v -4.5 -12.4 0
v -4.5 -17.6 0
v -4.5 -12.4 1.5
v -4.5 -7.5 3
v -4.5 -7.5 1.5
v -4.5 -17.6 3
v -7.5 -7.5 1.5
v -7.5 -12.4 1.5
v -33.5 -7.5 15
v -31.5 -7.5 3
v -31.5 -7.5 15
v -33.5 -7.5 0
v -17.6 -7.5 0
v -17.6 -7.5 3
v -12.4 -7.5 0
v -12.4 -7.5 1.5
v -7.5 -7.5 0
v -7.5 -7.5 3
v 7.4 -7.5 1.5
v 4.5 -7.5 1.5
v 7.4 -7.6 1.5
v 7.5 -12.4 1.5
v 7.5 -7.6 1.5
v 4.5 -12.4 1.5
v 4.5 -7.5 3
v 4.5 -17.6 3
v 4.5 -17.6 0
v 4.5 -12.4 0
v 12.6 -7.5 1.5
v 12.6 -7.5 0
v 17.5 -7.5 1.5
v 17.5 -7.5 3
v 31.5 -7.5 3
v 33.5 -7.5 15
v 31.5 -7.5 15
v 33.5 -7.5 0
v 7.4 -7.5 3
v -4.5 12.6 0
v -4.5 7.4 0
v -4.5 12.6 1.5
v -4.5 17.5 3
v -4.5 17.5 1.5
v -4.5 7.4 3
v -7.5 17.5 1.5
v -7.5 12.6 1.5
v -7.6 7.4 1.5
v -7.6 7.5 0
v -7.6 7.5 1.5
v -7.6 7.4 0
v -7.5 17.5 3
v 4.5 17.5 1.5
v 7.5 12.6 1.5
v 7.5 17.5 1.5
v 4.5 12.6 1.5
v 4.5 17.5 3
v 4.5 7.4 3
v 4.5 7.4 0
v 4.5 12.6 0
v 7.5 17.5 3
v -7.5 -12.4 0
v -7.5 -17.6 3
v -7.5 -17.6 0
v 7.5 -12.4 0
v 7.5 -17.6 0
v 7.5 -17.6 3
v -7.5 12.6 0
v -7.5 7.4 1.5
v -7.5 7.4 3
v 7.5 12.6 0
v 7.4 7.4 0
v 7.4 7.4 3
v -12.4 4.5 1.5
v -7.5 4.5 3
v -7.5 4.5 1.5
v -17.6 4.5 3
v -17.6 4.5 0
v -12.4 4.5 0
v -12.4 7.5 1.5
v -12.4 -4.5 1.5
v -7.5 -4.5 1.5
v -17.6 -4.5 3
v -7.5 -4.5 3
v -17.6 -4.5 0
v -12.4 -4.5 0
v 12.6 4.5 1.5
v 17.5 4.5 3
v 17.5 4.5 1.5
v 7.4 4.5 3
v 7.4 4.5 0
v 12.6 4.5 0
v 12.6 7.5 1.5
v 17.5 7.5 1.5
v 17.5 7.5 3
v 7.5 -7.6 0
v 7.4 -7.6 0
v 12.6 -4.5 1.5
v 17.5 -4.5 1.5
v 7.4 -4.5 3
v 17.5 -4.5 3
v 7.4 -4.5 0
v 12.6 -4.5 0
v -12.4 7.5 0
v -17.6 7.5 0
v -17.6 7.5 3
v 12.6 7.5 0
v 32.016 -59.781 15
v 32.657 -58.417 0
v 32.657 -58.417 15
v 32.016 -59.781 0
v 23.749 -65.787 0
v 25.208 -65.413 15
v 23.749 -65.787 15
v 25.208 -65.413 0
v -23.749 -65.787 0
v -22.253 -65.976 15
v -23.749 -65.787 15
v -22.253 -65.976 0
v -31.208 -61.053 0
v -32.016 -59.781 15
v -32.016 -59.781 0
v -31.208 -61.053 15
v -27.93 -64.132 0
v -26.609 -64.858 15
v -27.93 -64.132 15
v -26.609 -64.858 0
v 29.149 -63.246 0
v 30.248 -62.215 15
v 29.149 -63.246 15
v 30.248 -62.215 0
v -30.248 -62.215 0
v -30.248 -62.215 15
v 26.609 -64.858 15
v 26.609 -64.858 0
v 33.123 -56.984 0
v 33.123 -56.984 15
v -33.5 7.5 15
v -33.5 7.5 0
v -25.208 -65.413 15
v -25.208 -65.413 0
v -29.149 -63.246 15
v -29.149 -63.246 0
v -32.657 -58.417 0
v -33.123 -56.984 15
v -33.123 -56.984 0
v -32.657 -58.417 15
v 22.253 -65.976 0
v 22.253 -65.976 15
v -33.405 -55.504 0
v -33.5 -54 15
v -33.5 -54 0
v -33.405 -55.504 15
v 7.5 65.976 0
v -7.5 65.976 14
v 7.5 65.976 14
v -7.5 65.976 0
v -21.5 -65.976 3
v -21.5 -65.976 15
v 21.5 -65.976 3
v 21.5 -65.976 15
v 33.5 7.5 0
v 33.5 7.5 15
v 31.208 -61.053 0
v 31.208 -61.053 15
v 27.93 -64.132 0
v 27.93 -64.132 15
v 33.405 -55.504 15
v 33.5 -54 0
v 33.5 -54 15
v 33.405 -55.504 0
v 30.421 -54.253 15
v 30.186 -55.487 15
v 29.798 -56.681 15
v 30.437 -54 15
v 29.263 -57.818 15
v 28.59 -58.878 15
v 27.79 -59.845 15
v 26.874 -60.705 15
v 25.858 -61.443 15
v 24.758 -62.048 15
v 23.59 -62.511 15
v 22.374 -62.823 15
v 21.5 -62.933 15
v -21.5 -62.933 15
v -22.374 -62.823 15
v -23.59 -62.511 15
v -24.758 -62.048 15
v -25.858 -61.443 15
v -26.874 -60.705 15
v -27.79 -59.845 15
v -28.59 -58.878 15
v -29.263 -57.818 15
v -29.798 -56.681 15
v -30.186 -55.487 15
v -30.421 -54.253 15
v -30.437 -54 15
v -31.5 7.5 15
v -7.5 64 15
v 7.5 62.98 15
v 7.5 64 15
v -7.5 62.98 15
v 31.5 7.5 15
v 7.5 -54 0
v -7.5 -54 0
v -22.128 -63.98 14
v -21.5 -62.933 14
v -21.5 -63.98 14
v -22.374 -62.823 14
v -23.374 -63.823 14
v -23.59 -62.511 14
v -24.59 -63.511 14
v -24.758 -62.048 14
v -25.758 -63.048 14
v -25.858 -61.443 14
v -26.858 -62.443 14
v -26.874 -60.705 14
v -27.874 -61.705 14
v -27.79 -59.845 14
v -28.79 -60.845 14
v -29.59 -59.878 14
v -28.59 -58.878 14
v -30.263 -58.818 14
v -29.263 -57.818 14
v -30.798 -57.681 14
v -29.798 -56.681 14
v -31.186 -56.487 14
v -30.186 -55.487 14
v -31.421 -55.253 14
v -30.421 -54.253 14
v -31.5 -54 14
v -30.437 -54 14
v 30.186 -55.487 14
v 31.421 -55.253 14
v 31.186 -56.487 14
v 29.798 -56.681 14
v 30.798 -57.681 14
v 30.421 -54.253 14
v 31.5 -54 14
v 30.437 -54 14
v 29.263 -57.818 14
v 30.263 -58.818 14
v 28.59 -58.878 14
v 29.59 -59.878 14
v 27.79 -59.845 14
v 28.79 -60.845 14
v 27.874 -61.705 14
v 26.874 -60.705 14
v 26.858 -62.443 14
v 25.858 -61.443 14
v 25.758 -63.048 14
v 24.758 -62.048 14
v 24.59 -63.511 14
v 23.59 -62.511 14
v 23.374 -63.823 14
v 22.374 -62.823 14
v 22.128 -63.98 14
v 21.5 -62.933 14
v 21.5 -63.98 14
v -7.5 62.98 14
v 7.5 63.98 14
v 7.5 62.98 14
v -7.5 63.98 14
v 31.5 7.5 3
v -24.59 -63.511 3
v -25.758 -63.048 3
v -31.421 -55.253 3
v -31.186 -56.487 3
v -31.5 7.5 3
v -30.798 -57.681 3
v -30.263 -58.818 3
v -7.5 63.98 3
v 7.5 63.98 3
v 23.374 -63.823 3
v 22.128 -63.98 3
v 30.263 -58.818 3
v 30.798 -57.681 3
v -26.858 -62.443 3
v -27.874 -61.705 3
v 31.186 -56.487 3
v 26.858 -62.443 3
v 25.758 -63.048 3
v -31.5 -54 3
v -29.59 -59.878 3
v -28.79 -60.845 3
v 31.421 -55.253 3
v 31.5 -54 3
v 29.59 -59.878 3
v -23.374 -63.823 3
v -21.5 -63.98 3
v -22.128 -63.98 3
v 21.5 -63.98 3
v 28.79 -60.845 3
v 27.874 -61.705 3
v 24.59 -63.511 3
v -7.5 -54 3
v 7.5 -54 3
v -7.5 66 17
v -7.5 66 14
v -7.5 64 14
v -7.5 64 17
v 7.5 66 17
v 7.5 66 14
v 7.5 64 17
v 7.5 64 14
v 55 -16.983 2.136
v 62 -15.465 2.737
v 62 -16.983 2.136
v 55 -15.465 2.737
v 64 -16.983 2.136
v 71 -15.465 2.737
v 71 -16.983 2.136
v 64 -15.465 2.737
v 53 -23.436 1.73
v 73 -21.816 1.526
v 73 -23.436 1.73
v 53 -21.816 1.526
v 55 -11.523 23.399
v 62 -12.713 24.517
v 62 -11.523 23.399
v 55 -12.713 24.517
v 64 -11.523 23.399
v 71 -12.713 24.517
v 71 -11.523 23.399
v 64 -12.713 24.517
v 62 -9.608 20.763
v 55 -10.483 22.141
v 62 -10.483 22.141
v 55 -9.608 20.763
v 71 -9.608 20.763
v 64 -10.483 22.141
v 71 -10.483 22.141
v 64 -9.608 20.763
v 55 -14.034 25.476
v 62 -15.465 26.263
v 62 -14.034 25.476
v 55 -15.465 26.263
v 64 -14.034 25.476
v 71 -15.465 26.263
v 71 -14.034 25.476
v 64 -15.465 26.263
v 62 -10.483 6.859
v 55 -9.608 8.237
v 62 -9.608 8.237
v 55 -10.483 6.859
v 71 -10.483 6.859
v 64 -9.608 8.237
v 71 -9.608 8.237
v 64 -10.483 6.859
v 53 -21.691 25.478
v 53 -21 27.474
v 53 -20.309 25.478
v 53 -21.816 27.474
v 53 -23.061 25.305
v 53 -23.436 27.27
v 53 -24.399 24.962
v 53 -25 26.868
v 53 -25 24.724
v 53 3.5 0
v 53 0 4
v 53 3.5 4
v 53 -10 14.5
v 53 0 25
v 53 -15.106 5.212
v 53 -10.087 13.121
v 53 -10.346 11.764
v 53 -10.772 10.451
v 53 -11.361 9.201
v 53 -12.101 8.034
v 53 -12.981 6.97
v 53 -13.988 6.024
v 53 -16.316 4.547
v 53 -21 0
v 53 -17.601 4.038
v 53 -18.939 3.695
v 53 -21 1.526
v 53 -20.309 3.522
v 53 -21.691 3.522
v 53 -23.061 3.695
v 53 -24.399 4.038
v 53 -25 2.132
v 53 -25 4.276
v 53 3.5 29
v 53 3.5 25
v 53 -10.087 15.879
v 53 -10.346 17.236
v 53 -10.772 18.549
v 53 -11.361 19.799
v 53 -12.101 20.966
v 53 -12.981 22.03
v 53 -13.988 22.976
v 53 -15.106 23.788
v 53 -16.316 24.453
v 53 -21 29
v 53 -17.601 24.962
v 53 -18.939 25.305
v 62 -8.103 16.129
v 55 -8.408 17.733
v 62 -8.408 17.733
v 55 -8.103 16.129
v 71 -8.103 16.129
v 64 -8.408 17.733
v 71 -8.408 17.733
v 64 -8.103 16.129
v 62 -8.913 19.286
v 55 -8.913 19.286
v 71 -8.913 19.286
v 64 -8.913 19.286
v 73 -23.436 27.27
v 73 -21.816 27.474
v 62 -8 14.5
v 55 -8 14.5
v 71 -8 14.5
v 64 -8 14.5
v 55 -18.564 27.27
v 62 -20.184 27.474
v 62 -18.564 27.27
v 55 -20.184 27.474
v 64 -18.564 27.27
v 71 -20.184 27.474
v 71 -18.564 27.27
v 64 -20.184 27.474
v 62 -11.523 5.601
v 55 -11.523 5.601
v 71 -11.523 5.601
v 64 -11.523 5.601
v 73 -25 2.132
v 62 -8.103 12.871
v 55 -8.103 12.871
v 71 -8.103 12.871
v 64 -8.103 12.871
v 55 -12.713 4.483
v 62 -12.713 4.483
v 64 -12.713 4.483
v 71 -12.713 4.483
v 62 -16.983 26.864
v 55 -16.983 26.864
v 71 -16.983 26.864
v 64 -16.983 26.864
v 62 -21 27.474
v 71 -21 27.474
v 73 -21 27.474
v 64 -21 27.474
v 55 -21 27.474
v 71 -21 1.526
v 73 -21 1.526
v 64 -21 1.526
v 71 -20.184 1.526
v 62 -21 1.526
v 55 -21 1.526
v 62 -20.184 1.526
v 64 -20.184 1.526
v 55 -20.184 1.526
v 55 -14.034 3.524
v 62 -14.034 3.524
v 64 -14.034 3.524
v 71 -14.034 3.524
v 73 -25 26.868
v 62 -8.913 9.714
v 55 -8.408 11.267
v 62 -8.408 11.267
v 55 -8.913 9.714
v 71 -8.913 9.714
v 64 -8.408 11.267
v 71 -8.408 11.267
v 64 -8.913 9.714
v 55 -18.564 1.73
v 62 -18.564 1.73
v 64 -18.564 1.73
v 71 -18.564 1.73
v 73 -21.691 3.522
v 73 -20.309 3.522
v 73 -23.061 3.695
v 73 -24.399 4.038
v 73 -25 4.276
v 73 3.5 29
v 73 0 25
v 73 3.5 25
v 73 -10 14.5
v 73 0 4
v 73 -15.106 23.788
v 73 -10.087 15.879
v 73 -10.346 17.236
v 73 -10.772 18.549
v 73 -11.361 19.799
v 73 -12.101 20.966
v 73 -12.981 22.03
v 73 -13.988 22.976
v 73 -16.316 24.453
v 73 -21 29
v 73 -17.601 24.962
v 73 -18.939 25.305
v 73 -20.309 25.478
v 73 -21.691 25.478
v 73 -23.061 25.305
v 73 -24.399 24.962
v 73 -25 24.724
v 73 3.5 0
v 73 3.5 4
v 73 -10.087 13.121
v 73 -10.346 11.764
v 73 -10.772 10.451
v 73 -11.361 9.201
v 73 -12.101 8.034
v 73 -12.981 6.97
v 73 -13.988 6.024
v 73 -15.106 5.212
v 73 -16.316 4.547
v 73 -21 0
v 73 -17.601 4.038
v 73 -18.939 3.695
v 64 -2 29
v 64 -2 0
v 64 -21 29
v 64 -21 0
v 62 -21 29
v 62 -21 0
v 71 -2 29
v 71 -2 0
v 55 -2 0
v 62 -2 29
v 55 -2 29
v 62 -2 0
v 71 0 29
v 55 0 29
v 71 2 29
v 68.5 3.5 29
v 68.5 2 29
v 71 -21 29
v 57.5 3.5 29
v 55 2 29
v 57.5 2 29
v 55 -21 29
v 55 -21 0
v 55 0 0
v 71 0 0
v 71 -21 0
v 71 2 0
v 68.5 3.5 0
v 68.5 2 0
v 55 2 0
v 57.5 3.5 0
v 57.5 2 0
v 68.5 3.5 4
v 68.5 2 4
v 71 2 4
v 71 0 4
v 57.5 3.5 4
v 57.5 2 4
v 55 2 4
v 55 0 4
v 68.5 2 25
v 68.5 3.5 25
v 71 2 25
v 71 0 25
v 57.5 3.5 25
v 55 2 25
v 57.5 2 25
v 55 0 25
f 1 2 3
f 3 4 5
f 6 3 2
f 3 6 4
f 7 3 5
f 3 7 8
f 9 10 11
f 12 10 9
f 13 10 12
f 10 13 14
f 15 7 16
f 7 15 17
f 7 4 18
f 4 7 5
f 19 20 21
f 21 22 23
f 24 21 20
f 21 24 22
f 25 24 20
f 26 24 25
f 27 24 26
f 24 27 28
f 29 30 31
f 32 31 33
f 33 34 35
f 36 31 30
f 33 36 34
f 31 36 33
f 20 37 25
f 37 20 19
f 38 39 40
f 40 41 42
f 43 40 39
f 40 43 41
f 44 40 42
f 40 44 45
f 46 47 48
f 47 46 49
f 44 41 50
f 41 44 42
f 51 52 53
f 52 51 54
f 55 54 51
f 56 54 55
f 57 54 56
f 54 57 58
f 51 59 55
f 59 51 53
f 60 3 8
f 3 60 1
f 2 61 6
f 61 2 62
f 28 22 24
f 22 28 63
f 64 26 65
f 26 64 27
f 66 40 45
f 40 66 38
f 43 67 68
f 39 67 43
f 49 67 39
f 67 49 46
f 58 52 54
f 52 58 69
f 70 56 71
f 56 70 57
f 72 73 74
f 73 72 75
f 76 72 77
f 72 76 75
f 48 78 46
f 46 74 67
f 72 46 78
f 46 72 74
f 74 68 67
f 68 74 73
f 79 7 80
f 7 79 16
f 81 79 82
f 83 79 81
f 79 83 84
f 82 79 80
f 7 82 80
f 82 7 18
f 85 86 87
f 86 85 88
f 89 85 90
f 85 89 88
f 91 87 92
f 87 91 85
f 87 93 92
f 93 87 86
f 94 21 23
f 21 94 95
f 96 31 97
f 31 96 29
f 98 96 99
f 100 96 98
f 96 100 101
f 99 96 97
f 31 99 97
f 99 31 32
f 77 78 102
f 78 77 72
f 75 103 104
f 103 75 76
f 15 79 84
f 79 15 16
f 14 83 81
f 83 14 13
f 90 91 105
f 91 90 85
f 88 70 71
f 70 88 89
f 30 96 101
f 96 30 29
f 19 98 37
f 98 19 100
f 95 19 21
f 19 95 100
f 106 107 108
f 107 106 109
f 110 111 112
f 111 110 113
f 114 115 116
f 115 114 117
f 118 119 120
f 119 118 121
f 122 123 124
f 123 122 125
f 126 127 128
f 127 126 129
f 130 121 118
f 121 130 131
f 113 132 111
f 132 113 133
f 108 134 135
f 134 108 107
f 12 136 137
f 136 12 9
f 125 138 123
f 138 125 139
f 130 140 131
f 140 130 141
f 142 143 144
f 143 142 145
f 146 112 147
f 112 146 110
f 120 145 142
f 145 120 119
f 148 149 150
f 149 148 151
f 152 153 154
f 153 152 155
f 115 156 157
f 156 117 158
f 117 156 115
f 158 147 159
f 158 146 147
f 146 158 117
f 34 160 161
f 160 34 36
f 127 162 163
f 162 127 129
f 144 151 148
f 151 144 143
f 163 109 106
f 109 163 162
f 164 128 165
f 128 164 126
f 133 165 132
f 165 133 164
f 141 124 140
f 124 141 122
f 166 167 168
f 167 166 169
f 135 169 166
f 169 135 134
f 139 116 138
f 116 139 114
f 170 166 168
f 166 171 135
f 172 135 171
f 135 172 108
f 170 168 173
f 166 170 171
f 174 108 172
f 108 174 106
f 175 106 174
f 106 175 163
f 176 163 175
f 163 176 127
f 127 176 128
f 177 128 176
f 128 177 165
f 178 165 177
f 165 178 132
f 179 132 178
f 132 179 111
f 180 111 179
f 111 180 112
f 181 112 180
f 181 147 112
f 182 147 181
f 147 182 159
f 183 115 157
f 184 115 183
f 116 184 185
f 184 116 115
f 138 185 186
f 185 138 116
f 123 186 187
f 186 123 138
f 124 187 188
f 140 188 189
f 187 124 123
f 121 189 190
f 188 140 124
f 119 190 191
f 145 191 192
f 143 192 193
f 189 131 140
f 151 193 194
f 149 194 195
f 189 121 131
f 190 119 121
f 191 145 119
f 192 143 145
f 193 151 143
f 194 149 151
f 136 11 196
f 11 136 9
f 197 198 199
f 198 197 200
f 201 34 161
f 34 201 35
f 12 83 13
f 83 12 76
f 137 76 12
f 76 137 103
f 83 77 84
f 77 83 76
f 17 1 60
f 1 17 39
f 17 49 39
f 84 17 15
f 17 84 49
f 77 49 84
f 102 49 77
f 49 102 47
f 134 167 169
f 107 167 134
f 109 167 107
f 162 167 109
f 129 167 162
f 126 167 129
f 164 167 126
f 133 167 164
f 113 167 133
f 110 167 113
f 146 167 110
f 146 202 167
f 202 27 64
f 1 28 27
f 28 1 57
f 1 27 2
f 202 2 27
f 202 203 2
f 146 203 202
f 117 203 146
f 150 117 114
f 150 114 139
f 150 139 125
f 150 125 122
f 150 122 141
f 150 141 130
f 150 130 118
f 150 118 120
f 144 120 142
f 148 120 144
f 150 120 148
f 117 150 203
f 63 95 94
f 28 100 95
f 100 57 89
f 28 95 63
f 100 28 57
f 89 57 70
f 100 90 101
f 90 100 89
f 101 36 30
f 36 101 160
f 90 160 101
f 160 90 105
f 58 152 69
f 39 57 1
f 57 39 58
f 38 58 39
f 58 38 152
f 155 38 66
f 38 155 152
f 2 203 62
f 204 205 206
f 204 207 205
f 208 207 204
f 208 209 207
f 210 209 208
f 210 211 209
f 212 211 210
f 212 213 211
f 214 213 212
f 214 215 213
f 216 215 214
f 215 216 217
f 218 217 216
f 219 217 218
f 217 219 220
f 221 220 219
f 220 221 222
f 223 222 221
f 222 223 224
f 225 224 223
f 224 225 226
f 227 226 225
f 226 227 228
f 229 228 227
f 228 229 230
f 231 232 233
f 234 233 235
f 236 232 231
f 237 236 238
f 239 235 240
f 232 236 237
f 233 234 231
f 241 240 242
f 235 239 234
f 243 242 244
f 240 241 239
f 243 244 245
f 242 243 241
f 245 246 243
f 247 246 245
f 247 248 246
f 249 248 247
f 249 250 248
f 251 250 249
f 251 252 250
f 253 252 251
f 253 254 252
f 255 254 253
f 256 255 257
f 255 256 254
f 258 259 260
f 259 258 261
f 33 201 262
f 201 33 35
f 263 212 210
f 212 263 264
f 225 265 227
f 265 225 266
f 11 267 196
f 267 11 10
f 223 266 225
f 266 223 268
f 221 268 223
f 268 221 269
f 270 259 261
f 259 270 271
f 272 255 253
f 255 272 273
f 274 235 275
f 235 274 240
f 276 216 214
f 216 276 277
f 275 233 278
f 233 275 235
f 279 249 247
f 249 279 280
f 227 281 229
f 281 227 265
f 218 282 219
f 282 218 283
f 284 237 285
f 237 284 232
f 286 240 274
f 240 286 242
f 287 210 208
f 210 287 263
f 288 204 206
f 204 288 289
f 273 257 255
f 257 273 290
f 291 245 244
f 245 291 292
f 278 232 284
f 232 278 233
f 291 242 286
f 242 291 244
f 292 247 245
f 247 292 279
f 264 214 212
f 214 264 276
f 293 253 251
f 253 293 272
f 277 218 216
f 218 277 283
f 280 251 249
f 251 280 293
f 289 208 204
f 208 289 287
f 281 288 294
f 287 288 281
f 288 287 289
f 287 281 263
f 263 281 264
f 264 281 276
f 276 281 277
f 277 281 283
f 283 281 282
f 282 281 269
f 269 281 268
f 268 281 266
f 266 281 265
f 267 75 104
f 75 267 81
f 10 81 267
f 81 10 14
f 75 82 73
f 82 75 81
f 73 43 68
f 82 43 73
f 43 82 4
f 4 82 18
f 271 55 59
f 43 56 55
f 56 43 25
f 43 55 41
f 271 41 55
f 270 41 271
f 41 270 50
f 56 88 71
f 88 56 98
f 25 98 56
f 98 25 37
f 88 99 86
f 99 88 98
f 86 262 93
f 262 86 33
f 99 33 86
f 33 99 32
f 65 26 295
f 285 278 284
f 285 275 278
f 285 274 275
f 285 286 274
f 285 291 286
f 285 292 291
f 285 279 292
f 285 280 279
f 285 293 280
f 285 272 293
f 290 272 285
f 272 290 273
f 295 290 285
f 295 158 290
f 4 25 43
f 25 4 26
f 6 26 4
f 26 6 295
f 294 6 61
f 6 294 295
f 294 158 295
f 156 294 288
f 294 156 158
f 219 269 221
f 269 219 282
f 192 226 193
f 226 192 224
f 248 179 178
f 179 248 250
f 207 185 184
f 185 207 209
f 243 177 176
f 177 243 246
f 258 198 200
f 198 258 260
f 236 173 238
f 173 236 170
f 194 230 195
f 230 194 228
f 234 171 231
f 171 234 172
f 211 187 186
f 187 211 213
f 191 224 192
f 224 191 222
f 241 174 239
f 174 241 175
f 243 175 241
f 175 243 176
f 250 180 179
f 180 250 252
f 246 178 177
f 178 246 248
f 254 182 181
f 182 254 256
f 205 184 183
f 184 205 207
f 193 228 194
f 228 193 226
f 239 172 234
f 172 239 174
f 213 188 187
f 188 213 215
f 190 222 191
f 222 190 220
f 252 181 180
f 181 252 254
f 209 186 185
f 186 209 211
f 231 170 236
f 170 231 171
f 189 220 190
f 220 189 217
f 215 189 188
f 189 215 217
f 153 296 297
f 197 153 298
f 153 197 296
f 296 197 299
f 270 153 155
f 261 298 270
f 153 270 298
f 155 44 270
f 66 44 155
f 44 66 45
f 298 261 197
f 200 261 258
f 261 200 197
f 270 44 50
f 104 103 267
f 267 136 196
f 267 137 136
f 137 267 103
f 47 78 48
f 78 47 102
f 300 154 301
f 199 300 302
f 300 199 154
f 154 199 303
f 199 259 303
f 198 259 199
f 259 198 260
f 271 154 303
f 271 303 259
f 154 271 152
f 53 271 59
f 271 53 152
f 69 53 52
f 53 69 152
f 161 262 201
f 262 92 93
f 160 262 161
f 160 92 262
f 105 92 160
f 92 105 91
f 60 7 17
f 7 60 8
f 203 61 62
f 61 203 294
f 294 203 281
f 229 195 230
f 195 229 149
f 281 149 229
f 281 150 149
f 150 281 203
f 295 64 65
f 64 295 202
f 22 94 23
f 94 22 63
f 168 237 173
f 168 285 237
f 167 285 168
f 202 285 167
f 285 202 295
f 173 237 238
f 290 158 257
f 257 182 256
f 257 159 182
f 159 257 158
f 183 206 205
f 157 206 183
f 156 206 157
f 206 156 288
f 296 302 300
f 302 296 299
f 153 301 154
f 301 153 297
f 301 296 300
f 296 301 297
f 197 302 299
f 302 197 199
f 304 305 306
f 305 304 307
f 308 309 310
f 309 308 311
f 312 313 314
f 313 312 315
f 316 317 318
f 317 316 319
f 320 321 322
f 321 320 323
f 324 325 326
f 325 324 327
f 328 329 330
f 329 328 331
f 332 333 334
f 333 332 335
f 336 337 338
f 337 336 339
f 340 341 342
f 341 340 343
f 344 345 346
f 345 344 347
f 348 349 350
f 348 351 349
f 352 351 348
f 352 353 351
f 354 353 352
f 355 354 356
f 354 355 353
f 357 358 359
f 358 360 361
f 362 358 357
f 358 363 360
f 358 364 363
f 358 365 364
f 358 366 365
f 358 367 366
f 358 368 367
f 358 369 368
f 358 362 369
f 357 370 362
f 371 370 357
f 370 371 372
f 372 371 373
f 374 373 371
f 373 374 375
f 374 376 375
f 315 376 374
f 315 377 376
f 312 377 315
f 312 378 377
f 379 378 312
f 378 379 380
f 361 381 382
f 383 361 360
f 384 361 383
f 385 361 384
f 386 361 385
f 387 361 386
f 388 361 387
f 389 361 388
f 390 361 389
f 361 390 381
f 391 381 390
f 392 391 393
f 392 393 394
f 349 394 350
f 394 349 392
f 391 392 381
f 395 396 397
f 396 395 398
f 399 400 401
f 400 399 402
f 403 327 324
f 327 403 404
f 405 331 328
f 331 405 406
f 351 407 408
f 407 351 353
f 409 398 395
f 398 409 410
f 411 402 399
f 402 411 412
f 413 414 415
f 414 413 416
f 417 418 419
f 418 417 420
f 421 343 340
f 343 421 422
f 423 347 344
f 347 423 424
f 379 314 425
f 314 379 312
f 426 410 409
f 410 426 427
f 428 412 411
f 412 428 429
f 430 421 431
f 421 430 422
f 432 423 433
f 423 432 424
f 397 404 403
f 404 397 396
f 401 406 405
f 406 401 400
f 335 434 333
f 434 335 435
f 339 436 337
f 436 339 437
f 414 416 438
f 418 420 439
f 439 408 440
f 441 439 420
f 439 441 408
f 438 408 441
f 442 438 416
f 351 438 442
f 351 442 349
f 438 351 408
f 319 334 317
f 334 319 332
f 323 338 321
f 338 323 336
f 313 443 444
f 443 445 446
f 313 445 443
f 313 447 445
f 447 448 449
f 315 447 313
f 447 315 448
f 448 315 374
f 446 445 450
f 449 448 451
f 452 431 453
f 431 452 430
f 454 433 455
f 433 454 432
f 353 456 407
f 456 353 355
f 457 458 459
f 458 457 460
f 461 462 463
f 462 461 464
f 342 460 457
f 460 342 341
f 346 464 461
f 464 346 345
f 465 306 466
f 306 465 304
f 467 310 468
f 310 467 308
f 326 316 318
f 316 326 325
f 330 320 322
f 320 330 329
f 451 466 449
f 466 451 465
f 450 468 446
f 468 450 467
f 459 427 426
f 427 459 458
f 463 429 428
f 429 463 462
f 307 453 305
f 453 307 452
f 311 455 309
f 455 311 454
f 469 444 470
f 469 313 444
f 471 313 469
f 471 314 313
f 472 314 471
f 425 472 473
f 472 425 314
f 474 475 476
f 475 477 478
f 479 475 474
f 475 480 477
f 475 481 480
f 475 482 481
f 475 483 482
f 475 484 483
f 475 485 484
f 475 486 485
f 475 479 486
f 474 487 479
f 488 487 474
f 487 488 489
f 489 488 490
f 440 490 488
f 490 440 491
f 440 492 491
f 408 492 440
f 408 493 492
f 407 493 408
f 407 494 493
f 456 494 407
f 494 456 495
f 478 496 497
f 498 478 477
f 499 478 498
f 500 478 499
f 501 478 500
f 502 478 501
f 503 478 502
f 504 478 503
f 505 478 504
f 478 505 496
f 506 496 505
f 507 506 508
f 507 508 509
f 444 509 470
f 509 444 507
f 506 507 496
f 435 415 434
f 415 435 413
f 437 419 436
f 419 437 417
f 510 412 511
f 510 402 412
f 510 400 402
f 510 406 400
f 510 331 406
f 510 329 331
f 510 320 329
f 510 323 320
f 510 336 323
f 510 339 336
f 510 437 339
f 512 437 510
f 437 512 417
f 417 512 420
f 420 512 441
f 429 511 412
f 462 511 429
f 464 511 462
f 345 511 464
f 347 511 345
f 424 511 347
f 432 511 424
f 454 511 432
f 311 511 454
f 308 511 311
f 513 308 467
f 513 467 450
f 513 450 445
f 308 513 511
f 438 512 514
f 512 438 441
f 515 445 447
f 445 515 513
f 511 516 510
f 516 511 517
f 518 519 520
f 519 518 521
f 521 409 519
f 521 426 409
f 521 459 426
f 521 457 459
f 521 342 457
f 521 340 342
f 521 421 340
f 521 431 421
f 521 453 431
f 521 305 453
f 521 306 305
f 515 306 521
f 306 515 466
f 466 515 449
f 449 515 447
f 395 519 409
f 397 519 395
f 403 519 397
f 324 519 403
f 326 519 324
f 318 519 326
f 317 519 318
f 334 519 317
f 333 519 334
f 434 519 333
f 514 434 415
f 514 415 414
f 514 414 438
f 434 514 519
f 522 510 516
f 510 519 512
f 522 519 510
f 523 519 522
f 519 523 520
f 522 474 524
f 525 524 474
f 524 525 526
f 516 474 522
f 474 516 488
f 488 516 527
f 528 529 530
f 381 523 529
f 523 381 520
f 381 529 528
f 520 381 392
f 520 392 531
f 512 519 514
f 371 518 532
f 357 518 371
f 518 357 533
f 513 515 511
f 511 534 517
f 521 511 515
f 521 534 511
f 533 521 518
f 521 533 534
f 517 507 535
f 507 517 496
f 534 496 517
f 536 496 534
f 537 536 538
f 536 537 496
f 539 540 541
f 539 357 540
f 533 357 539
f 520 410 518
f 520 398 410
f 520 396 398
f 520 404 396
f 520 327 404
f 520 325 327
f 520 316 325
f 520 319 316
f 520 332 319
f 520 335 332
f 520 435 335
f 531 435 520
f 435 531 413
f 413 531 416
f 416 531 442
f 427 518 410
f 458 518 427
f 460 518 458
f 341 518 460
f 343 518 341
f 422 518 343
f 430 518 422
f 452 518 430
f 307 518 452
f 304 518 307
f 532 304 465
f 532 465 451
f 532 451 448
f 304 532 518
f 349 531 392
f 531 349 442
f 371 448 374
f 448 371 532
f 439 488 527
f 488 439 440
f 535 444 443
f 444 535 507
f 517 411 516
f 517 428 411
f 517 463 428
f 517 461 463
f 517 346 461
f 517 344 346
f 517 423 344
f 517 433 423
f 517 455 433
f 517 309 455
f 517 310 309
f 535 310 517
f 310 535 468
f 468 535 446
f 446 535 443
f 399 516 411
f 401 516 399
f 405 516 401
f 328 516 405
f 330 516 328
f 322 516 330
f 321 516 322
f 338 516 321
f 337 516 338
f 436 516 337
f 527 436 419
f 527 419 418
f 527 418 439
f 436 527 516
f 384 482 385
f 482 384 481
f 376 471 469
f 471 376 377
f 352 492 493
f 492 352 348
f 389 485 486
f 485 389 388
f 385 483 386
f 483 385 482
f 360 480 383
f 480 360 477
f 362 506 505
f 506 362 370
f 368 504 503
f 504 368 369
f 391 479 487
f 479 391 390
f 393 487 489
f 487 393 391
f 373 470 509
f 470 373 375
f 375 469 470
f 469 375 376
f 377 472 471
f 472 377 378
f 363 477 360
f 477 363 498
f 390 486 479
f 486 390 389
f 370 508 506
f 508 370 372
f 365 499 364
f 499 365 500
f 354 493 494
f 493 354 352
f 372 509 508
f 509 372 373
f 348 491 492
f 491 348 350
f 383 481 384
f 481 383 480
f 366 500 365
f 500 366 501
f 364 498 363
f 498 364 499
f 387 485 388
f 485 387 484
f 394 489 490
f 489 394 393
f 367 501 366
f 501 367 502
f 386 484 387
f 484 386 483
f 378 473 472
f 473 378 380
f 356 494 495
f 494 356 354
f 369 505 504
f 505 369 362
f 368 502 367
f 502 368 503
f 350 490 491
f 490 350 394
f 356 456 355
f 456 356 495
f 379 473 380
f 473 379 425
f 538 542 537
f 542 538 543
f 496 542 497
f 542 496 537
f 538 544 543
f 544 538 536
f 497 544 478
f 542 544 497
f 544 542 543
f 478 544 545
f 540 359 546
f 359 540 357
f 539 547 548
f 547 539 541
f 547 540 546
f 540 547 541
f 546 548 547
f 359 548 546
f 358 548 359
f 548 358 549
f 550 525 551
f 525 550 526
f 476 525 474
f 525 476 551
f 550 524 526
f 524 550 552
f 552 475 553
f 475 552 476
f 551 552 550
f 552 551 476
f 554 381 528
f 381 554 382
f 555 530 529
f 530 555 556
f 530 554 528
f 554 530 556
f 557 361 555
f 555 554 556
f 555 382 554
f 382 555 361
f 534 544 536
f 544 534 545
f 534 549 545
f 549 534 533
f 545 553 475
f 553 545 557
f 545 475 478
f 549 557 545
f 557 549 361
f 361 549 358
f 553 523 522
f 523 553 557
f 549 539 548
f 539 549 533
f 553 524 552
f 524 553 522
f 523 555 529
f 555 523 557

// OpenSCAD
// The outer width (from left to right without buttons) of the phone or bumper in millimeters
width = 63;
// The outer length (from top to bottom without buttons) of the phone or bumper in millimeters
length = 128;
// The outer height (from backside to front side) of the phone or bumper in millimeters
height = 11;
// The width of the bridges from top to bottom and from left to right in millimeters. Lower values save material, higher values make the mount more stable. 15 millimeter is a good choice.
bridgewidth = 15;
// The radius of the corners of the phone or bumper. The standard Apple bumper for iPhone 5 has a corner radius of 10 millimeter.
cornerradius = 10;
// The distance bwtween the iPhone holder and the bike's tube in millimeter. Make it larger when you have other obstacles mounted on the bike.
mountheight = 10;
// The diameter of the tube where to mount the holder in millimeters.
tubediameter = 22;
// The fininess of the cylinders. 100 is a good start.
$fn = 50;

module connector(stegwidth) {
	// plates
	translate([-stegwidth/2-2.5,-stegwidth/2-4.5,2]) cube([4.5,4,1.5]);
	translate([stegwidth/2-2,-stegwidth/2-4.5,2]) cube([4.5,4,1.5]);
	translate([-stegwidth/2-2.5,stegwidth/2+5.5,2]) cube([4.5,4,1.5]);
	translate([stegwidth/2-2,stegwidth/2+5.5,2]) cube([4.5,4,1.5]);
	// pins
	translate([-stegwidth/2-2.5,-stegwidth/2-4.5,0]) cube([2,4,2]);
	translate([stegwidth/2+0.5,-stegwidth/2-4.5,0]) cube([2,4,2]);
	translate([-stegwidth/2-2.5,stegwidth/2+5.5,0]) cube([2,4,2]);
	translate([stegwidth/2+0.5,stegwidth/2+5.5,0]) cube([2,4,2]);
}

module connectorcutout(stegwidth) {
		translate([-stegwidth/2-0.1,-stegwidth/2-5,1.5]) cube([3.1,5,1.6]);
		translate([stegwidth/2-3,-stegwidth/2-5,1.5]) cube([3.1,5,1.6]);
		translate([-stegwidth/2-0.1,stegwidth/2+5,1.5]) cube([3.1,5,1.6]);
		translate([stegwidth/2-3,stegwidth/2+5,1.5]) cube([3.1,5,1.6]);
		translate([-stegwidth/2-0.1,-stegwidth/2-10.1,-0.1]) cube([3.1,5.2,3.2]);
		translate([stegwidth/2-3,-stegwidth/2-10.1,-0.1]) cube([3.1,5.2,3.2]);
		translate([-stegwidth/2-0.1,stegwidth/2-0.1,-0.1]) cube([3.1,5.2,3.2]);
		translate([stegwidth/2-3,stegwidth/2-0.1,-0.1]) cube([3.1,5.2,3.2]);
}

module case(width, height, depth, radius, stegwidth) {
	difference() {
		// Outer hull
		hull() {
			translate([-width/2+radius, -height/2+radius, 0]) cylinder(r=radius+2, h=depth+4);
			translate([-width/2+radius, +height/2-radius, 0]) cylinder(r=radius+2, h=depth+4);
			translate([+width/2-radius, -height/2+radius, 0]) cylinder(r=radius+2, h=depth+4);
			translate([+width/2-radius, +height/2-radius, 0]) cylinder(r=radius+2, h=depth+4);
		}
		// substract iPhone itself
		hull() {
			translate([-width/2+radius, -height/2+radius, 3]) cylinder(r=radius, h=depth);
			translate([-width/2+radius, +height/2-radius, 3]) cylinder(r=radius, h=depth);
			translate([+width/2-radius, -height/2+radius, 3]) cylinder(r=radius, h=depth);
			translate([+width/2-radius, +height/2-radius, 3]) cylinder(r=radius, h=depth);
		}
		// display
		hull() {
			translate([-width/2+radius+1, -height/2+radius+1, depth+2.9]) cylinder(r=radius, h=1.2);
			translate([-width/2+radius+1, +height/2-radius-1, depth+2.9]) cylinder(r=radius, h=1.2);
			translate([+width/2-radius-1, -height/2+radius+1, depth+2.9]) cylinder(r=radius, h=1.2);
			translate([+width/2-radius-1, +height/2-radius-1, depth+2.9]) cylinder(r=radius, h=1.2);
		}
		// left and right pins
		translate([-width/2,-stegwidth/2-0.1,depth+2.9]) cube([width,stegwidth+0.2,1.2]);
		// upper left corner
		translate([-width/2-2.1, +stegwidth/2, -0.1]) cube([width/2-stegwidth/2+2.1,height/2-2.9,depth+4.2]);
		// upper right corner
		translate([+stegwidth/2, +stegwidth/2, -0.1]) cube([width/2-stegwidth/2+2.1,height/2-2.9,depth+4.2]);
		// lower left cut
		translate([-width/2-2.1, -height/2+radius, -0.1]) cube([width/2-stegwidth/2+2.1,height/2-stegwidth/2-radius,depth+4.2]);
		// lower right cut
		translate([+stegwidth/2, -height/2+radius, -0.1]) cube([width/2-stegwidth/2+2.1,height/2-stegwidth/2-radius,depth+4.2]);
		// lower connectors cut
		translate([-width/2+radius, -height/2-2.1, 3]) cube([width-radius-radius,3.2,depth+4.2]);
		// vertical connector cutouts
		connectorcutout(stegwidth);
		// horizontal connector cutouts
		rotate([0, 0, -90]) connectorcutout(stegwidth);
	}
	// Schnippel zum losmachen
	translate([-stegwidth/2,height/2,depth+3]) cube([stegwidth,2,3]);
}

module holder(height, radius, stegwidth) {
	// upper plate
	translate([-stegwidth/2-2.5,-stegwidth/2-7,0]) cube([stegwidth+5,stegwidth+14,2]);
	// ring
	difference() {
		union() {
			translate([-stegwidth/2-2.5,0,radius+height]) rotate([0,90,0]) cylinder(r=radius+2,h=stegwidth+5);
			// vertikale Stege
			translate([-1, -stegwidth/2-7, 2]) cube([2,stegwidth+14,radius+height-2]);
			translate([-stegwidth/2-2.5, -stegwidth/2-7, 2]) cube([2,stegwidth+14,radius+height-2]);
			translate([stegwidth/2+0.5, -stegwidth/2-7, 2]) cube([2,stegwidth+14,radius+height-2]);
		}
		translate([-stegwidth/2-2.6,0,radius+height]) rotate([0,90,0]) cylinder(r=radius,h=stegwidth+5.2);
		// lower ring cut
		translate([-stegwidth/2-2.6, -radius-2.1, radius+height+4]) cube([stegwidth+5.2,radius*2+4.2,radius+4]);
	}
	// connector
	translate([0,-2.5,0]) rotate([0, 180, 0]) connector(stegwidth);
}

case(width, length, height, cornerradius, bridgewidth);
rotate([90,0,0]) translate([width, tubediameter/2+2 > 14.5 ? tubediameter/2+2 : 14.5, 0]) holder(mountheight, tubediameter/2, bridgewidth);
//rotate([180,0,90]) translate([0, 2, 0]) holder(mountheight, tubediameter/2, bridgewidth);
//rotate([90,0,0]) translate([width, 14.5, 0]) holder(mountheight, tubediameter/2, bridgewidth);
